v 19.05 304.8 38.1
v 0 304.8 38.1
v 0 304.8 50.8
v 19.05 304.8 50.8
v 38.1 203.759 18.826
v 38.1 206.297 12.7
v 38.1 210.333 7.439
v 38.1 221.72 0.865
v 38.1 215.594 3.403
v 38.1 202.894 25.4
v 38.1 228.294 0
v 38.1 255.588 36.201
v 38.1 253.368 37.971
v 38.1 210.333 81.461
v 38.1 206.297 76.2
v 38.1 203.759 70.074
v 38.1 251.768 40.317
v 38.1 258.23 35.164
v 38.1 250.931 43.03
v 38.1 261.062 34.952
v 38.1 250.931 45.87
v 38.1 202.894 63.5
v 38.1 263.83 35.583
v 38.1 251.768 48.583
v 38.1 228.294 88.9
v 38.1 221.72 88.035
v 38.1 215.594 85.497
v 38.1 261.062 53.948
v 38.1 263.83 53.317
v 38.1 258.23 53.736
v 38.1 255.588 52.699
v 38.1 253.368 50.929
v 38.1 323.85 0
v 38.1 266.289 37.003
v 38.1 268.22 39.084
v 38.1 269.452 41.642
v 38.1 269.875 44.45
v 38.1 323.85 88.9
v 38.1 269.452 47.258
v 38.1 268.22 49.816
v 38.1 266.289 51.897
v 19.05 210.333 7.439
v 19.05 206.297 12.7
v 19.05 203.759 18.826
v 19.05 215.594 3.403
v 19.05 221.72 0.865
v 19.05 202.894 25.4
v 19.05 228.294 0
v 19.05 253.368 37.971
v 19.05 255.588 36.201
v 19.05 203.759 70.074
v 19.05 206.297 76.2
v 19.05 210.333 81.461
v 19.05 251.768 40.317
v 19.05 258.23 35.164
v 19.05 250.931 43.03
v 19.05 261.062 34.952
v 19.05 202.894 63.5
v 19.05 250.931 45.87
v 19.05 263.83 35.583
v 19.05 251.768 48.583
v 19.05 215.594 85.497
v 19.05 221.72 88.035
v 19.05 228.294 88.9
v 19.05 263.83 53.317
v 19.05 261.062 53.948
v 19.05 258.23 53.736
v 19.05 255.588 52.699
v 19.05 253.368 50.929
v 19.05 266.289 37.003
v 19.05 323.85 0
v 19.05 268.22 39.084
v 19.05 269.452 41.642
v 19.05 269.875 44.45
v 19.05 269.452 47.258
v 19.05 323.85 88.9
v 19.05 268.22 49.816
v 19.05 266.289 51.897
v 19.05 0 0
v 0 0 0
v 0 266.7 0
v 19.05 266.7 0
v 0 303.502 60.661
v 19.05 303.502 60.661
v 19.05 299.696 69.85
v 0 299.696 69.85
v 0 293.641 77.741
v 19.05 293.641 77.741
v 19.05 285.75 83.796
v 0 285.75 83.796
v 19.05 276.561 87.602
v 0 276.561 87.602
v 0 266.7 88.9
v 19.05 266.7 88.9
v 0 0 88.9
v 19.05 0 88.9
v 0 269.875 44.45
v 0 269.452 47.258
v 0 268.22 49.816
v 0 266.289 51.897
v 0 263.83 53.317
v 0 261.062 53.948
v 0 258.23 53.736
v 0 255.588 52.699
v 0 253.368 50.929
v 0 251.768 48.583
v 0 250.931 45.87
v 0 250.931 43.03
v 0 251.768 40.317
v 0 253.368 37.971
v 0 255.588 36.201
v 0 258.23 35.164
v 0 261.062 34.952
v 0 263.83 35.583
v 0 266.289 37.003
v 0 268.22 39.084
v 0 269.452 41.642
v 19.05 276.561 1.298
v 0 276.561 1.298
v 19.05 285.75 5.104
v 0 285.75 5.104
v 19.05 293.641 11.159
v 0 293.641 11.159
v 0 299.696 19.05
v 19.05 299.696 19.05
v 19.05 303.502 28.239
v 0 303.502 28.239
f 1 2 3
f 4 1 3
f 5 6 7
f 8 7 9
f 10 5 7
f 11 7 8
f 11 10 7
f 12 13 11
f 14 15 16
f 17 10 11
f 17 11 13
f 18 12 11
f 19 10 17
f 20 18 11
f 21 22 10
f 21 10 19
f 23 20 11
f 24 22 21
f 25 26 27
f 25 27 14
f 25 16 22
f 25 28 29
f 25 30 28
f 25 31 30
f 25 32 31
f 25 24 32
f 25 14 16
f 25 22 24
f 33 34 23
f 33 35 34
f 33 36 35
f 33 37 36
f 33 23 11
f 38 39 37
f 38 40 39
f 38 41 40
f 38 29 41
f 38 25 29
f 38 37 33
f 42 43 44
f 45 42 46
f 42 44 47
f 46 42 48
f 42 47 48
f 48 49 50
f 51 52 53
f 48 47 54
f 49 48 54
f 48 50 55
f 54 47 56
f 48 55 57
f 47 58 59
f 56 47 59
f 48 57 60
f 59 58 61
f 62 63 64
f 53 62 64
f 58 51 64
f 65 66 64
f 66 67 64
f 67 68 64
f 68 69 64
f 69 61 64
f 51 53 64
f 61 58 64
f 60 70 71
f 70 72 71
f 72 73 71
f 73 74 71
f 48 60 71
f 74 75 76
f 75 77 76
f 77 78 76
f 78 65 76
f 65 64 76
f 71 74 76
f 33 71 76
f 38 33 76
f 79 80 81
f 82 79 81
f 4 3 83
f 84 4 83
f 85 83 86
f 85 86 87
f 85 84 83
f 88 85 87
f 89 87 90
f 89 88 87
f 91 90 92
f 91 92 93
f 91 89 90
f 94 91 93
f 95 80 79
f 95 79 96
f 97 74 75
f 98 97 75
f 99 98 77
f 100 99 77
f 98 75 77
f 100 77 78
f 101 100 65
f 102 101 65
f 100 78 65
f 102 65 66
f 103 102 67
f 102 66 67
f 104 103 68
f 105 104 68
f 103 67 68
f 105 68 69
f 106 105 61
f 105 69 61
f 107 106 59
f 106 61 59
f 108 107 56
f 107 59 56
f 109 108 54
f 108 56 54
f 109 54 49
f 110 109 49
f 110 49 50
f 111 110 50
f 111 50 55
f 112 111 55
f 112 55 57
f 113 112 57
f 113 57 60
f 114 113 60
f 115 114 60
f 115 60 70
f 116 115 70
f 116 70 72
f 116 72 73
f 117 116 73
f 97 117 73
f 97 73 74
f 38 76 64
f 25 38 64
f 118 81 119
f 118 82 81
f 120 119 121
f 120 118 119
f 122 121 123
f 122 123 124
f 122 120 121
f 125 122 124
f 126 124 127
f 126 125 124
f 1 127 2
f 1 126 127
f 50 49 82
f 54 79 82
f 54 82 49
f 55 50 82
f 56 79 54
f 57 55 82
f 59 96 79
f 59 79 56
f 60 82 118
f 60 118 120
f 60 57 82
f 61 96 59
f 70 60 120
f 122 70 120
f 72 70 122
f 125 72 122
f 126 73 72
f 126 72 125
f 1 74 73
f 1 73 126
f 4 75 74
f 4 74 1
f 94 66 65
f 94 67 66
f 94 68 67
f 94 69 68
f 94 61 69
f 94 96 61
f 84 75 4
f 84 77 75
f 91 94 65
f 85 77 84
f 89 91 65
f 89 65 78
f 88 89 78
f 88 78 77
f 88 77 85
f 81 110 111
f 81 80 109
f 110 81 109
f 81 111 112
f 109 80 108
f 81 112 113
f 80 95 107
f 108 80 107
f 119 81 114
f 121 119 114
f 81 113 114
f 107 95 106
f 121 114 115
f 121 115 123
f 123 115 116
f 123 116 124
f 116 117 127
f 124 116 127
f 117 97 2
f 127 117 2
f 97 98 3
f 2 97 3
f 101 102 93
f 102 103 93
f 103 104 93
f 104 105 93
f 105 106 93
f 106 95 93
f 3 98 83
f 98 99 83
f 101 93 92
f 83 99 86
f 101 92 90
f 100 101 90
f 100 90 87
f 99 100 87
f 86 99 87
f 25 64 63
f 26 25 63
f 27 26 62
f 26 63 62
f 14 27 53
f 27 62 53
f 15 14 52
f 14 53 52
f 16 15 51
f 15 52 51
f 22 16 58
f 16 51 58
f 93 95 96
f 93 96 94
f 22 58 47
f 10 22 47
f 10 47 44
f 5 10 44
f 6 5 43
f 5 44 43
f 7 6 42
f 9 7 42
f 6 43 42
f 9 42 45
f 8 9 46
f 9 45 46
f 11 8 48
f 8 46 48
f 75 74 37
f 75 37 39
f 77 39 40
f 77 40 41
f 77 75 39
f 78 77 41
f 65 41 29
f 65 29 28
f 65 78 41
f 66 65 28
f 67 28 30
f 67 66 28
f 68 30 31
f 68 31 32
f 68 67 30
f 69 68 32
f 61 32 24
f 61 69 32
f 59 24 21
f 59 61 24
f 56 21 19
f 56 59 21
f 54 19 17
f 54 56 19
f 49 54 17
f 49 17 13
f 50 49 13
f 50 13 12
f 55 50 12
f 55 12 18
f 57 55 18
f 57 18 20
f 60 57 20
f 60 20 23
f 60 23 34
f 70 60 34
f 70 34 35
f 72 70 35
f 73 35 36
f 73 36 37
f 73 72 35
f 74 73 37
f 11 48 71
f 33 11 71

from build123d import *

# Parameters (mm, degrees)
F0_W     = 304.8
F0_H     = 88.9
F1_DEPTH = 19.05
F2_R     = 38.1
F3_R     = 9.525
F4_DEPTH = 19.051
F5_R     = 9.525
F6_DEPTH = 19.05


with BuildPart() as f1:
    # F0 (on Right) → F1 (new body)
    with BuildSketch(Plane.YZ):
        with Locations((152.4, 44.45)):
            Rectangle(F0_W, F0_H)
    extrude(amount=F1_DEPTH)

    # F2
    f2_edges = [f1.edges().sort_by_distance(p)[0] for p in [
        (9.525, 304.8, 88.9),
        (9.525, 304.8, 0),
    ]]
    fillet(f2_edges, radius=F2_R)

    # F3 (on face) → F4 (cut, through all)
    with BuildSketch(Plane.YZ.offset(19.05)):
        with Locations((260.35, 44.45)):
            Circle(F3_R)
    extrude(amount=-F4_DEPTH, mode=Mode.SUBTRACT)


with BuildPart() as f6:
    # F5 (on face) → F6 (new body)
    with BuildSketch(Plane.YZ.offset(19.05)):
        with BuildLine():
            Line((266.7, 88.9), (228.293974, 88.9))
            ThreePointArc((228.293974, 88.9), (210.333462, 81.460512), (202.893974, 63.5))
            Line((202.893974, 63.5), (202.893974, 25.4))
            ThreePointArc((202.893974, 25.4), (210.333462, 7.439488), (228.293974, 0))
            Line((228.293974, 0), (266.7, 0))
            ThreePointArc((266.7, 0), (293.640768, 11.159232), (304.8, 38.1))
            Line((304.8, 38.1), (304.8, 50.8))
            ThreePointArc((304.8, 50.8), (293.640768, 77.740768), (266.7, 88.9))
        make_face()
        with Locations((260.35, 44.45)):
            Circle(F5_R, mode=Mode.SUBTRACT)
        with BuildLine():
            Line((323.85, 88.9), (266.7, 88.9))
            ThreePointArc((266.7, 88.9), (293.640768, 77.740768), (304.8, 50.8))
            Line((304.8, 50.8), (304.8, 38.1))
            ThreePointArc((304.8, 38.1), (293.640768, 11.159232), (266.7, 0))
            Line((266.7, 0), (323.85, 0))
            Line((323.85, 0), (323.85, 88.9))
        make_face()
    extrude(amount=F6_DEPTH)


solid = Compound([f1.part, f6.part])
